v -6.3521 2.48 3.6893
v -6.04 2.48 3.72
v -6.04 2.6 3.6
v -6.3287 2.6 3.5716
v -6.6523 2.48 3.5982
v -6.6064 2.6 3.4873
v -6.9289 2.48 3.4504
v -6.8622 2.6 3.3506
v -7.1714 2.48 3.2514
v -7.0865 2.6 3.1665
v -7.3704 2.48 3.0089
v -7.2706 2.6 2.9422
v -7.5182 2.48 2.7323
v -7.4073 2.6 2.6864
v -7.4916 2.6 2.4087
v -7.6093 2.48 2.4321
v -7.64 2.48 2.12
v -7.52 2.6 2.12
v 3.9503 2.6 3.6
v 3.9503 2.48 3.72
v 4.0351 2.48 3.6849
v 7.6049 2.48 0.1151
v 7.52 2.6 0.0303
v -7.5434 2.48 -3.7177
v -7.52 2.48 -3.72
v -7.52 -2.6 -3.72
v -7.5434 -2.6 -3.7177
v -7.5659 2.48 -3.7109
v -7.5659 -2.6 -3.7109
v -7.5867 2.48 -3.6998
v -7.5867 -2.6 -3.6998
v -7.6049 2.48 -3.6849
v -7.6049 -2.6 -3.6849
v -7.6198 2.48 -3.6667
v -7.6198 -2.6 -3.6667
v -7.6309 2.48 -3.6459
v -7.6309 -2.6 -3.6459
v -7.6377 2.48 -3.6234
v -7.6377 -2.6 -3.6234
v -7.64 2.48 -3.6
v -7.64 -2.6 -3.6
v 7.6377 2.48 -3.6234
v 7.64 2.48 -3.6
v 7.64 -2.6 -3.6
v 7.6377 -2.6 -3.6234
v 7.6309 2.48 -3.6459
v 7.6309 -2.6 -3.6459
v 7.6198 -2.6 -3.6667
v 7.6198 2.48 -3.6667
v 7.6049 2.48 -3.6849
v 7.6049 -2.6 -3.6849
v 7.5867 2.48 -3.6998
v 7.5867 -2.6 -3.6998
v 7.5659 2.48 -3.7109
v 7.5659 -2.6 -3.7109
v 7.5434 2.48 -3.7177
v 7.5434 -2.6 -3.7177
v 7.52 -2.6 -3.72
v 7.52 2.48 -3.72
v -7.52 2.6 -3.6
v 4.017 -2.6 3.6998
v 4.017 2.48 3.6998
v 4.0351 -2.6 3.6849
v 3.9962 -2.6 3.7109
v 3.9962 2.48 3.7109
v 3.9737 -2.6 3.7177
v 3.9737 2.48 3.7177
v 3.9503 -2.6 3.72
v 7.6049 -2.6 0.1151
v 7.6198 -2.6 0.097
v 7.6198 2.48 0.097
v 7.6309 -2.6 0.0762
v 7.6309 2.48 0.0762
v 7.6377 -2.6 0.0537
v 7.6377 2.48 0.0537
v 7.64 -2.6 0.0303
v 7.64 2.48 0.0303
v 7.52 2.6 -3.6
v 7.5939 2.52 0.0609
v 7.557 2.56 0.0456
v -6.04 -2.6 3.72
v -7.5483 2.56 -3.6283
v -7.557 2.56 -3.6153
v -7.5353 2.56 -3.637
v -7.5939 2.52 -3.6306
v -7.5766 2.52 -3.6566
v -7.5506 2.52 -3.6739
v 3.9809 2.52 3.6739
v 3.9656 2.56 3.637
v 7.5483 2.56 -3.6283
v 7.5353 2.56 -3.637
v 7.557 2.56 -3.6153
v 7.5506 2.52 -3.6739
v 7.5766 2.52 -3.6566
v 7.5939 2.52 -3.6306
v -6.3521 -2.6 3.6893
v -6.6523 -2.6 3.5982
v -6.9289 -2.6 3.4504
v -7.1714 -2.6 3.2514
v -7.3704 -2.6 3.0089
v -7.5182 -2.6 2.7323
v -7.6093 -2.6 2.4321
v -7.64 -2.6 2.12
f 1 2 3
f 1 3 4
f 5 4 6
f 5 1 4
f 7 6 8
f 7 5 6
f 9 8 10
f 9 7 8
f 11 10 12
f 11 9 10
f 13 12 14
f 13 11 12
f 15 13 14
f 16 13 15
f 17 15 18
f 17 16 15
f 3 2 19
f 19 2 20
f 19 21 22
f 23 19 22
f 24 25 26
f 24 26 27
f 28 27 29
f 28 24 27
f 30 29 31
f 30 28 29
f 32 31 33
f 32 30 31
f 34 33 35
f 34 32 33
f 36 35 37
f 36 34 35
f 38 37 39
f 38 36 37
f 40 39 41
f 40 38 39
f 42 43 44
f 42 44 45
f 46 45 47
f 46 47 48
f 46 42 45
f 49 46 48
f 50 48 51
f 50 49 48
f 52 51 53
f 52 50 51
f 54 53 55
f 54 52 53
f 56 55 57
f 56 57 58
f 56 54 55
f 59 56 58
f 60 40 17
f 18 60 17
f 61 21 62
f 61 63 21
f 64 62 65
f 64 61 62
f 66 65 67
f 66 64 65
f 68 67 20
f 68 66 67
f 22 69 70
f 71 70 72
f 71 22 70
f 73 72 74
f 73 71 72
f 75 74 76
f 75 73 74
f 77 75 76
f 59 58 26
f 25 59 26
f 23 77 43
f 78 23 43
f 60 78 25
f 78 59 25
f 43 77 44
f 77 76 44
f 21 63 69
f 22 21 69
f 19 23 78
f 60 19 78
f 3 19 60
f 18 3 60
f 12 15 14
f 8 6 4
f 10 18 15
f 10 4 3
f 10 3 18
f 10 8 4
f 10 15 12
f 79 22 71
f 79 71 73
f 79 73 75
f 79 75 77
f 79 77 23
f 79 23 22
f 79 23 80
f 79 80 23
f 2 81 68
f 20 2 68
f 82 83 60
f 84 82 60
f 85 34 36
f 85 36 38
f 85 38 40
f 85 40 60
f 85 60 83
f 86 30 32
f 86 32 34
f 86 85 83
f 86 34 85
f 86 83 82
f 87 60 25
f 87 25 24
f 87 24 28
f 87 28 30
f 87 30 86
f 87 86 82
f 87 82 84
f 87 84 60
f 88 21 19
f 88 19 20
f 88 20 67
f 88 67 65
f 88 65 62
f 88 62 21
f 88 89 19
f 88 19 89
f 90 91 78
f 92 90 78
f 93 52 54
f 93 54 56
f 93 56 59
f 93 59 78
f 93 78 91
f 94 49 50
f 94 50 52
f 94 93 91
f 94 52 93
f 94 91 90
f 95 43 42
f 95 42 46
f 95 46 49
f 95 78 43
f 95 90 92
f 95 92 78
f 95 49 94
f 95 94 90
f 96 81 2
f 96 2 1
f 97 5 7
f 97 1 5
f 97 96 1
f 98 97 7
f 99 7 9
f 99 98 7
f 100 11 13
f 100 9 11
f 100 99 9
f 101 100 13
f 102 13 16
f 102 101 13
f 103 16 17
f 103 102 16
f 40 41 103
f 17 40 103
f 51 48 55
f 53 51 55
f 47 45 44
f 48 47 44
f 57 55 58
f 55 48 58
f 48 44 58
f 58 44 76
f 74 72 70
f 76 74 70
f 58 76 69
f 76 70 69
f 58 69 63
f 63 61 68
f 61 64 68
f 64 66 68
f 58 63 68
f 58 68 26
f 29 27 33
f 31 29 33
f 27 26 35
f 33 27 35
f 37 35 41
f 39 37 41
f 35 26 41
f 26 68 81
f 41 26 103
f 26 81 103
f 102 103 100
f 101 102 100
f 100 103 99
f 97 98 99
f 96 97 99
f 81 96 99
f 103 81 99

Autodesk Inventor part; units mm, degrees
ref_plane "YZ Plane" through (0, 0, 0) normal (1, 0, 0) x (0, 1, 0)
ref_plane "XZ Plane" through (0, 0, 0) normal (0, 1, 0) x (-1, 0, 0)
ref_plane "XY Plane" through (0, 0, 0) normal (0, 0, 1) x (1, 0, 0)
sketch "Sketch2" plane through (0, 0, 0) normal (0, 1, 0) x (-1, 0, 0)
  line L0 (-7.64, 0.08) -> (-7.64, -3.72)
  line L1 (-7.64, -3.72) -> (7.64, -3.72)
  line L2 (7.64, -3.72) -> (7.64, 2.12)
  arc A0 (7.64, 2.12) -> (6.04, 3.72) centre (6.04, 2.12) ccw
  line L3 (6.04, 3.72) -> (-4, 3.72)
  line L4 (-4, 3.72) -> (-7.64, 0.08)
  line L5 (0, -3.72) -> (0, 3.72) construction
  point P0 (0, 0)
  point P1 (0, 0)
  dimension "d0" = 7.44
  dimension "d1" = 15.28
  dimension "d2" = 1.6
  dimension "d3" = 3.64
  dimension "d4" = 3.64
extrude "Extrusion1" add sketch "Sketch2" along normal mid plane 5.2
fillet "Fillet1" radius 0.12 4 edges at (4, 0, 3.72) (7.64, 0, 0.08) (7.64, 0, -3.72) (-7.64, 0, -3.72)
chamfer "Chamfer2" distance 0.12 angle 45 10 edges at (-7.1714, 2.6, 3.2514) (-1.0449, 2.6, 3.72) (3.9962, 2.6, 3.7109) (5.82, 2.6, 1.9) (7.6309, 2.6, 0.0762) (7.64, 2.6, -1.7849) (7.6049, 2.6, -3.6849) (0, 2.6, -3.72) (-7.6049, 2.6, -3.6849) (-7.64, 2.6, -0.74)
equation "\"d4\" = d3"
properties part number "11030-LtBluishGray" material "ABS Plastic"
